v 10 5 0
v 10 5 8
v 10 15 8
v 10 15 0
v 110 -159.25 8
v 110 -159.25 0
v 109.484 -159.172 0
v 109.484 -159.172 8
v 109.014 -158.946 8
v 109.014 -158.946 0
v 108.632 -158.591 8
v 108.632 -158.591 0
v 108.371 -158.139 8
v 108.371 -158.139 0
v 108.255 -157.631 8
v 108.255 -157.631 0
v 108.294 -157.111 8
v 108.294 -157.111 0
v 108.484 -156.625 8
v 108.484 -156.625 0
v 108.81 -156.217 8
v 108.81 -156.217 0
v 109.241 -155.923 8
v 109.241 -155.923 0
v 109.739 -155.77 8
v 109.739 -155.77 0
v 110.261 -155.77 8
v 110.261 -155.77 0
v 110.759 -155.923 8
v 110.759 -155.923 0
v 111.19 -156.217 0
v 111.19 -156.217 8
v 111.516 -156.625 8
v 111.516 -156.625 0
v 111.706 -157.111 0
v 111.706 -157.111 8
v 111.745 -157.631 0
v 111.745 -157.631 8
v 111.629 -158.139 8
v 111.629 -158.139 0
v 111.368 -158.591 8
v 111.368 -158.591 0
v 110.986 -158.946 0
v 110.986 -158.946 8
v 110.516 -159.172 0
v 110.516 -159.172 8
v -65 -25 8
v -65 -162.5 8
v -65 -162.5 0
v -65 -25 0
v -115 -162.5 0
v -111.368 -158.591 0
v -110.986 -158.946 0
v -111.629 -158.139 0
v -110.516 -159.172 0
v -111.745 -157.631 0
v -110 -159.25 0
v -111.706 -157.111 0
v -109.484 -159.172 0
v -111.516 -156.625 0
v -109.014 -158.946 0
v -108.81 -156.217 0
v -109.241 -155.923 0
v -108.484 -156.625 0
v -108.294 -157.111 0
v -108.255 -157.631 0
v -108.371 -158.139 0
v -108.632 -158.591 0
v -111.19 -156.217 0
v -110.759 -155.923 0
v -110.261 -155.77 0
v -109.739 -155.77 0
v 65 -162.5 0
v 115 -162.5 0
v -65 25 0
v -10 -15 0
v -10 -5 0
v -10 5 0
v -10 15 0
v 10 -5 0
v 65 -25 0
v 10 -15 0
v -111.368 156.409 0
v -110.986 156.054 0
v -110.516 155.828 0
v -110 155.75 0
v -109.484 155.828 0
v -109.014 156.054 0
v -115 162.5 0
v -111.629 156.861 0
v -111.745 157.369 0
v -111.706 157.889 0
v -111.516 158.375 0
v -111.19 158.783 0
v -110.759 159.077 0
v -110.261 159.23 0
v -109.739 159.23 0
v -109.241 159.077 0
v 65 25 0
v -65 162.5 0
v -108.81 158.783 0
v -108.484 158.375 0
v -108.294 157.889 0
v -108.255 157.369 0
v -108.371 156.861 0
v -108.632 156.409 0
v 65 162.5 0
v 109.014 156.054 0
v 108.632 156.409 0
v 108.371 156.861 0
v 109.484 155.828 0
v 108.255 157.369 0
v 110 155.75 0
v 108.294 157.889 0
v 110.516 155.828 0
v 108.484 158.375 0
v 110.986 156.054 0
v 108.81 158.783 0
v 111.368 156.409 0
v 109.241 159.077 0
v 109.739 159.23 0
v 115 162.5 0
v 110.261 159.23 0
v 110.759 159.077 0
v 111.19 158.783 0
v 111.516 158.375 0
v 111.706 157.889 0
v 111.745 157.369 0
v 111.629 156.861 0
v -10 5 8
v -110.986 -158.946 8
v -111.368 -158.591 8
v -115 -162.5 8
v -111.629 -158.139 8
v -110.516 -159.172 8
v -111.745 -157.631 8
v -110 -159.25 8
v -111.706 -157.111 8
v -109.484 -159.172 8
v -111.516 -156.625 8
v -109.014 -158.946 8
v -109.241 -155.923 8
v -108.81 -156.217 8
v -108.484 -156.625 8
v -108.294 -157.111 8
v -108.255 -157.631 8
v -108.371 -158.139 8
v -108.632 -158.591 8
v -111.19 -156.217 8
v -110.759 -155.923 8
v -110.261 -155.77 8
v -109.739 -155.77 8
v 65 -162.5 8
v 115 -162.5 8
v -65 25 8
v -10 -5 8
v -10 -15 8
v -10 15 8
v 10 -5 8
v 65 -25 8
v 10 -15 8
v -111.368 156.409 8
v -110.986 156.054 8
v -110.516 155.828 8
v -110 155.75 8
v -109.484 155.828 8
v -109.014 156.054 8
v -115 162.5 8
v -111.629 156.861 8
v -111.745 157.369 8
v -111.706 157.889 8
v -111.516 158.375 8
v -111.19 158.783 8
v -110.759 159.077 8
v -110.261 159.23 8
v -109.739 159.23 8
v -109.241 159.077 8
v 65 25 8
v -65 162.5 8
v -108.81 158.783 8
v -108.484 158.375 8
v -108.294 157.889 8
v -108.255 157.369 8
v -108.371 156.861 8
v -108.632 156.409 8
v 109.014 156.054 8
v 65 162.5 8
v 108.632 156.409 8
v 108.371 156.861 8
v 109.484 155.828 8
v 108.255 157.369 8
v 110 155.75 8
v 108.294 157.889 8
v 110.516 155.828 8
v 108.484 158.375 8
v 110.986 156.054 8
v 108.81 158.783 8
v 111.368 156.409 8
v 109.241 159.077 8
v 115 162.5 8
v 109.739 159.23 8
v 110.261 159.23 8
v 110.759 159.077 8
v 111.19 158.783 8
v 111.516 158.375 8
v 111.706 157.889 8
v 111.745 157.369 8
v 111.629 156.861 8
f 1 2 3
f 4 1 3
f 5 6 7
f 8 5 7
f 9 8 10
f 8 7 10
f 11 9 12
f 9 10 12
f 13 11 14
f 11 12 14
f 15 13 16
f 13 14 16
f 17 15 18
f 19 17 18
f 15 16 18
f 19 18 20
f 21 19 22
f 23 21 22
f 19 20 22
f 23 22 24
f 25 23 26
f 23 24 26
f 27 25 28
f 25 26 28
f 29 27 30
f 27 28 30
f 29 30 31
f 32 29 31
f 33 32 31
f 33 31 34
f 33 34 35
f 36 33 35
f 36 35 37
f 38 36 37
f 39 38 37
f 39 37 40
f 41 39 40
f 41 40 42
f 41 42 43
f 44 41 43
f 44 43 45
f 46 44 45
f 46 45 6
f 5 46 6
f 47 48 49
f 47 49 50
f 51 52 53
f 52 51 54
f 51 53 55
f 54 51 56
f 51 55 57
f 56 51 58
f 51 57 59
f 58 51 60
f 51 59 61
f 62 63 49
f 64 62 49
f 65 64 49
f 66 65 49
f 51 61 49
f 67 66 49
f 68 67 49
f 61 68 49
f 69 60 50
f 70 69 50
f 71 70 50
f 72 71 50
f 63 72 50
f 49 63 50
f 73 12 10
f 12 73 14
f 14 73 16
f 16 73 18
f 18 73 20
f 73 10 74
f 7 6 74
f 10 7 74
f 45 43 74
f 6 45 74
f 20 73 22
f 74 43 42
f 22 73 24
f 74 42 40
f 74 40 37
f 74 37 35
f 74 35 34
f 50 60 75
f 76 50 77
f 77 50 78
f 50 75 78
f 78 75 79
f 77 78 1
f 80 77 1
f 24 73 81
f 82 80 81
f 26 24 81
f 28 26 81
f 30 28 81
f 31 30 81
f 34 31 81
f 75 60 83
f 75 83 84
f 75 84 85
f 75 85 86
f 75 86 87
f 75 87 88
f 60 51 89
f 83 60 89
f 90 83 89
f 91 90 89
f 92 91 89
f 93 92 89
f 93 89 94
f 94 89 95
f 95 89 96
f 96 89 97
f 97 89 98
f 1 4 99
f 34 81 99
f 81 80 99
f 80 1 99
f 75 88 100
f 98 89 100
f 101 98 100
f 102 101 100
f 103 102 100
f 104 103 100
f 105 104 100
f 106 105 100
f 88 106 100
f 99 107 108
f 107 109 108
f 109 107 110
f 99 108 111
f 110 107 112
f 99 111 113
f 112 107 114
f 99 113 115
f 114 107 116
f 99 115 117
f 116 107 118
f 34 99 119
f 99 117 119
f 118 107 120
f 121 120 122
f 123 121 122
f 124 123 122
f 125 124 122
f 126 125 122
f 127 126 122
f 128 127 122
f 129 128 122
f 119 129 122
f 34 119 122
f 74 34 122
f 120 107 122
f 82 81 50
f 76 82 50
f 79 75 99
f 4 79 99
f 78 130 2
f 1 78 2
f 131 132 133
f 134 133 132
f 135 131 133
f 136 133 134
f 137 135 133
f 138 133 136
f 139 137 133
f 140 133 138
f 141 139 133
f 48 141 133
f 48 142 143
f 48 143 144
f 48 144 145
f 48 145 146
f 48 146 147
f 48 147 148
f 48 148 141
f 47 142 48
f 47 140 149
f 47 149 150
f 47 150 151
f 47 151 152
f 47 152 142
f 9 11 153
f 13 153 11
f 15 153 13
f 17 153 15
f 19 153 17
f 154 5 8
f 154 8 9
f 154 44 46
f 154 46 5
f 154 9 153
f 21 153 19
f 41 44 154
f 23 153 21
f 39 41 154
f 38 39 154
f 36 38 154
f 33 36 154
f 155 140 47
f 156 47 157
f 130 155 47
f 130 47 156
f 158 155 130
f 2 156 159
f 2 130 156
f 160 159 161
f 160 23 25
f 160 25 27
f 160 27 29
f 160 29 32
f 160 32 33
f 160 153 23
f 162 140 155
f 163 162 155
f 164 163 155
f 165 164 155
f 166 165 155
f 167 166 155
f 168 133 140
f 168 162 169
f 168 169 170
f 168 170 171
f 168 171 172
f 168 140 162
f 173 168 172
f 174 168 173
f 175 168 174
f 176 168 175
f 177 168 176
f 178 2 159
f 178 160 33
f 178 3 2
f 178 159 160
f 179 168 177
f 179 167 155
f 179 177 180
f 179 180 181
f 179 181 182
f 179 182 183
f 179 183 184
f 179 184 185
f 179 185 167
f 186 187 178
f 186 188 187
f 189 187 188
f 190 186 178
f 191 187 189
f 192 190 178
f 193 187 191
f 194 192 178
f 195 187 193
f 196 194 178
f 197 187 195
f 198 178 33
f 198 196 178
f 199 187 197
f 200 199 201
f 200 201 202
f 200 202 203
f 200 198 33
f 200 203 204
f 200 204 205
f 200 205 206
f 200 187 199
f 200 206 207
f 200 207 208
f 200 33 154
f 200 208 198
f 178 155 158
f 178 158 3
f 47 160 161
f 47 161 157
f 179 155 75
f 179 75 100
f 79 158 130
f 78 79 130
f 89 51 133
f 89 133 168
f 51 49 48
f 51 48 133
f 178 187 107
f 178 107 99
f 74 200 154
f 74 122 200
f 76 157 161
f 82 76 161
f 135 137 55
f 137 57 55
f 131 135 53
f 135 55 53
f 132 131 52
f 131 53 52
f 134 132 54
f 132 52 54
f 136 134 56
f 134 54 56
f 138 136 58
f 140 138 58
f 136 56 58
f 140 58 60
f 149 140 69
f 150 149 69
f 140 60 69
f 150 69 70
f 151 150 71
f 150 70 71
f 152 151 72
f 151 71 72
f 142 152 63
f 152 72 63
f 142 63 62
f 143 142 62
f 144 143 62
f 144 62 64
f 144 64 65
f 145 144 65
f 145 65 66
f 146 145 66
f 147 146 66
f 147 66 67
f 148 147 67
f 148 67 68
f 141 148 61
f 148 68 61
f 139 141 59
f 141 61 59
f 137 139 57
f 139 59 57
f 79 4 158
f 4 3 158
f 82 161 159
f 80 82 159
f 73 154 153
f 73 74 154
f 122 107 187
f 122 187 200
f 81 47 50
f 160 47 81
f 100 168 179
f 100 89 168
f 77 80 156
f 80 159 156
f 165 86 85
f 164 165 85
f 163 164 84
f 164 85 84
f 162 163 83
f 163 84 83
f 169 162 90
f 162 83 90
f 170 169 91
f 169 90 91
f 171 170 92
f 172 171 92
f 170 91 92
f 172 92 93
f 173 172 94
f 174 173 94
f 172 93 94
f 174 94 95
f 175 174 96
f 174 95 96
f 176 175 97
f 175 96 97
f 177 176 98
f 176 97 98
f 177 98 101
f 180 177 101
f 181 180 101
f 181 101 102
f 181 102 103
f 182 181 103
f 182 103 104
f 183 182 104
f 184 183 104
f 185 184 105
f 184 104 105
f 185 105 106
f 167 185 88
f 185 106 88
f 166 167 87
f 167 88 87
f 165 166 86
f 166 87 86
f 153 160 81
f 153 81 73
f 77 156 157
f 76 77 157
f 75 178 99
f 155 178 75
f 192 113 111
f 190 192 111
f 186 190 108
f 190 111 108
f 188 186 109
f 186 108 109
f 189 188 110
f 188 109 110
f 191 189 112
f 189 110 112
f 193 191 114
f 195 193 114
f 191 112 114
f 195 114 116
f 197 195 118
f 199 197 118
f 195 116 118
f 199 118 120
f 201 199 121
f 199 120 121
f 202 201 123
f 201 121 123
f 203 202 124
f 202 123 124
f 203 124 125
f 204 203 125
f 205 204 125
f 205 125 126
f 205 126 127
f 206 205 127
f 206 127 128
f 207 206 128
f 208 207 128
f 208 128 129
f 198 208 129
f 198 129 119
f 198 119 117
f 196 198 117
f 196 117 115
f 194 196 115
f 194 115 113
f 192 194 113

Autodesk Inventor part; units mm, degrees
ref_plane "YZ Plane" through (0, 0, 0) normal (1, 0, 0) x (0, 1, 0)
ref_plane "XZ Plane" through (0, 0, 0) normal (0, 1, 0) x (-1, 0, 0)
ref_plane "XY Plane" through (0, 0, 0) normal (0, 0, 1) x (1, 0, 0)
sketch "Sketch1" plane through (0, 0, 0) normal (0, 0, 1) x (1, 0, 0)
  line L0 (-115, 162.5) -> (115, 162.5)
  line L1 (115, 162.5) -> (115, -162.5)
  line L2 (115, -162.5) -> (-115, -162.5)
  line L3 (-115, -162.5) -> (-115, 162.5)
  point P0 (0, 0)
  point P1 (0, 162.5)
  point P2 (-115, 0)
  dimension "d0" = 230
  dimension "d1" = 325
extrude "Extrusion1" add sketch "Sketch1" along normal blind 8
sketch "Sketch2" plane through (0, 0, 8) normal (0, 0, 1) x (1, 0, 0)
  line L0 (-110, -157.5) -> (110, -157.5) construction
  line L1 (110, -157.5) -> (110, 157.5) construction
  line L2 (110, 157.5) -> (-110, 157.5) construction
  line L3 (-110, 157.5) -> (-110, -157.5) construction
  line L4 (-115, 162.5) -> (-115, -162.5) construction
  line L5 (115, 162.5) -> (-115, 162.5) construction
  point P0 (0, 0)
  point P1 (-110, 0)
  point P2 (-115, 0)
  point P3 (-115, 0)
  point P4 (0, 157.5)
  point P5 (0, 162.5)
  dimension "d4" = 5
  dimension "d5" = 5
hole "Hole1" at (-110, -157.5, 8) at (-110, 157.5, 8) at (110, 157.5, 8) at (110, -157.5, 8) direction (0, 0, -1) diameter 3.5 end through all
sketch "Sketch3" plane through (0, 0, 8) normal (0, 0, 1) x (1, 0, 0)
  line L0 (65, -162.5) -> (-65, -162.5)
  line L1 (-65, -162.5) -> (-65, -25)
  line L2 (-65, -25) -> (65, -25)
  line L3 (65, -25) -> (65, -162.5)
  line L4 (-115, -162.5) -> (115, -162.5) projected
  line L5 (115, -162.5) -> (115, 162.5) projected
  line L6 (-115, 162.5) -> (-115, -162.5) projected
  line L7 (65, 25) -> (-65, 25)
  line L8 (-65, 25) -> (-65, 162.5)
  line L9 (-65, 162.5) -> (65, 162.5)
  line L10 (65, 162.5) -> (65, 25)
  line L11 (115, 162.5) -> (-115, 162.5) projected
  point P0 (0, 0)
  dimension "d13" = 50
  dimension "d14" = 50
  dimension "d15" = 25
  dimension "d16" = 25
extrude "Extrusion2" cut sketch "Sketch3" against normal blind 10 contours L0 L1 L2 L3 | L10 L7 L8 L9
sketch "Sketch4" plane through (0, 0, 8) normal (0, 0, 1) x (1, 0, 0)
  line L0 (-10, -15) -> (10, -15)
  line L1 (10, -15) -> (10, -5)
  line L2 (10, -5) -> (-10, -5)
  line L3 (-10, -5) -> (-10, -15)
  line L4 (-10, 5) -> (10, 5)
  line L5 (10, 5) -> (10, 15)
  line L6 (10, 15) -> (-10, 15)
  line L7 (-10, 15) -> (-10, 5)
  line L8 (-65, -25) -> (65, -25) projected
  line L9 (65, 25) -> (-65, 25) projected
  point P0 (0, 0)
  point P1 (0, -5)
  point P2 (0, 5)
  dimension "d19" = 10
  dimension "d20" = 10
  dimension "d21" = 10
  dimension "d22" = 20
extrude "Extrusion3" cut sketch "Sketch4" against normal through all
properties part number "0005-10-014 Suport Bed"
